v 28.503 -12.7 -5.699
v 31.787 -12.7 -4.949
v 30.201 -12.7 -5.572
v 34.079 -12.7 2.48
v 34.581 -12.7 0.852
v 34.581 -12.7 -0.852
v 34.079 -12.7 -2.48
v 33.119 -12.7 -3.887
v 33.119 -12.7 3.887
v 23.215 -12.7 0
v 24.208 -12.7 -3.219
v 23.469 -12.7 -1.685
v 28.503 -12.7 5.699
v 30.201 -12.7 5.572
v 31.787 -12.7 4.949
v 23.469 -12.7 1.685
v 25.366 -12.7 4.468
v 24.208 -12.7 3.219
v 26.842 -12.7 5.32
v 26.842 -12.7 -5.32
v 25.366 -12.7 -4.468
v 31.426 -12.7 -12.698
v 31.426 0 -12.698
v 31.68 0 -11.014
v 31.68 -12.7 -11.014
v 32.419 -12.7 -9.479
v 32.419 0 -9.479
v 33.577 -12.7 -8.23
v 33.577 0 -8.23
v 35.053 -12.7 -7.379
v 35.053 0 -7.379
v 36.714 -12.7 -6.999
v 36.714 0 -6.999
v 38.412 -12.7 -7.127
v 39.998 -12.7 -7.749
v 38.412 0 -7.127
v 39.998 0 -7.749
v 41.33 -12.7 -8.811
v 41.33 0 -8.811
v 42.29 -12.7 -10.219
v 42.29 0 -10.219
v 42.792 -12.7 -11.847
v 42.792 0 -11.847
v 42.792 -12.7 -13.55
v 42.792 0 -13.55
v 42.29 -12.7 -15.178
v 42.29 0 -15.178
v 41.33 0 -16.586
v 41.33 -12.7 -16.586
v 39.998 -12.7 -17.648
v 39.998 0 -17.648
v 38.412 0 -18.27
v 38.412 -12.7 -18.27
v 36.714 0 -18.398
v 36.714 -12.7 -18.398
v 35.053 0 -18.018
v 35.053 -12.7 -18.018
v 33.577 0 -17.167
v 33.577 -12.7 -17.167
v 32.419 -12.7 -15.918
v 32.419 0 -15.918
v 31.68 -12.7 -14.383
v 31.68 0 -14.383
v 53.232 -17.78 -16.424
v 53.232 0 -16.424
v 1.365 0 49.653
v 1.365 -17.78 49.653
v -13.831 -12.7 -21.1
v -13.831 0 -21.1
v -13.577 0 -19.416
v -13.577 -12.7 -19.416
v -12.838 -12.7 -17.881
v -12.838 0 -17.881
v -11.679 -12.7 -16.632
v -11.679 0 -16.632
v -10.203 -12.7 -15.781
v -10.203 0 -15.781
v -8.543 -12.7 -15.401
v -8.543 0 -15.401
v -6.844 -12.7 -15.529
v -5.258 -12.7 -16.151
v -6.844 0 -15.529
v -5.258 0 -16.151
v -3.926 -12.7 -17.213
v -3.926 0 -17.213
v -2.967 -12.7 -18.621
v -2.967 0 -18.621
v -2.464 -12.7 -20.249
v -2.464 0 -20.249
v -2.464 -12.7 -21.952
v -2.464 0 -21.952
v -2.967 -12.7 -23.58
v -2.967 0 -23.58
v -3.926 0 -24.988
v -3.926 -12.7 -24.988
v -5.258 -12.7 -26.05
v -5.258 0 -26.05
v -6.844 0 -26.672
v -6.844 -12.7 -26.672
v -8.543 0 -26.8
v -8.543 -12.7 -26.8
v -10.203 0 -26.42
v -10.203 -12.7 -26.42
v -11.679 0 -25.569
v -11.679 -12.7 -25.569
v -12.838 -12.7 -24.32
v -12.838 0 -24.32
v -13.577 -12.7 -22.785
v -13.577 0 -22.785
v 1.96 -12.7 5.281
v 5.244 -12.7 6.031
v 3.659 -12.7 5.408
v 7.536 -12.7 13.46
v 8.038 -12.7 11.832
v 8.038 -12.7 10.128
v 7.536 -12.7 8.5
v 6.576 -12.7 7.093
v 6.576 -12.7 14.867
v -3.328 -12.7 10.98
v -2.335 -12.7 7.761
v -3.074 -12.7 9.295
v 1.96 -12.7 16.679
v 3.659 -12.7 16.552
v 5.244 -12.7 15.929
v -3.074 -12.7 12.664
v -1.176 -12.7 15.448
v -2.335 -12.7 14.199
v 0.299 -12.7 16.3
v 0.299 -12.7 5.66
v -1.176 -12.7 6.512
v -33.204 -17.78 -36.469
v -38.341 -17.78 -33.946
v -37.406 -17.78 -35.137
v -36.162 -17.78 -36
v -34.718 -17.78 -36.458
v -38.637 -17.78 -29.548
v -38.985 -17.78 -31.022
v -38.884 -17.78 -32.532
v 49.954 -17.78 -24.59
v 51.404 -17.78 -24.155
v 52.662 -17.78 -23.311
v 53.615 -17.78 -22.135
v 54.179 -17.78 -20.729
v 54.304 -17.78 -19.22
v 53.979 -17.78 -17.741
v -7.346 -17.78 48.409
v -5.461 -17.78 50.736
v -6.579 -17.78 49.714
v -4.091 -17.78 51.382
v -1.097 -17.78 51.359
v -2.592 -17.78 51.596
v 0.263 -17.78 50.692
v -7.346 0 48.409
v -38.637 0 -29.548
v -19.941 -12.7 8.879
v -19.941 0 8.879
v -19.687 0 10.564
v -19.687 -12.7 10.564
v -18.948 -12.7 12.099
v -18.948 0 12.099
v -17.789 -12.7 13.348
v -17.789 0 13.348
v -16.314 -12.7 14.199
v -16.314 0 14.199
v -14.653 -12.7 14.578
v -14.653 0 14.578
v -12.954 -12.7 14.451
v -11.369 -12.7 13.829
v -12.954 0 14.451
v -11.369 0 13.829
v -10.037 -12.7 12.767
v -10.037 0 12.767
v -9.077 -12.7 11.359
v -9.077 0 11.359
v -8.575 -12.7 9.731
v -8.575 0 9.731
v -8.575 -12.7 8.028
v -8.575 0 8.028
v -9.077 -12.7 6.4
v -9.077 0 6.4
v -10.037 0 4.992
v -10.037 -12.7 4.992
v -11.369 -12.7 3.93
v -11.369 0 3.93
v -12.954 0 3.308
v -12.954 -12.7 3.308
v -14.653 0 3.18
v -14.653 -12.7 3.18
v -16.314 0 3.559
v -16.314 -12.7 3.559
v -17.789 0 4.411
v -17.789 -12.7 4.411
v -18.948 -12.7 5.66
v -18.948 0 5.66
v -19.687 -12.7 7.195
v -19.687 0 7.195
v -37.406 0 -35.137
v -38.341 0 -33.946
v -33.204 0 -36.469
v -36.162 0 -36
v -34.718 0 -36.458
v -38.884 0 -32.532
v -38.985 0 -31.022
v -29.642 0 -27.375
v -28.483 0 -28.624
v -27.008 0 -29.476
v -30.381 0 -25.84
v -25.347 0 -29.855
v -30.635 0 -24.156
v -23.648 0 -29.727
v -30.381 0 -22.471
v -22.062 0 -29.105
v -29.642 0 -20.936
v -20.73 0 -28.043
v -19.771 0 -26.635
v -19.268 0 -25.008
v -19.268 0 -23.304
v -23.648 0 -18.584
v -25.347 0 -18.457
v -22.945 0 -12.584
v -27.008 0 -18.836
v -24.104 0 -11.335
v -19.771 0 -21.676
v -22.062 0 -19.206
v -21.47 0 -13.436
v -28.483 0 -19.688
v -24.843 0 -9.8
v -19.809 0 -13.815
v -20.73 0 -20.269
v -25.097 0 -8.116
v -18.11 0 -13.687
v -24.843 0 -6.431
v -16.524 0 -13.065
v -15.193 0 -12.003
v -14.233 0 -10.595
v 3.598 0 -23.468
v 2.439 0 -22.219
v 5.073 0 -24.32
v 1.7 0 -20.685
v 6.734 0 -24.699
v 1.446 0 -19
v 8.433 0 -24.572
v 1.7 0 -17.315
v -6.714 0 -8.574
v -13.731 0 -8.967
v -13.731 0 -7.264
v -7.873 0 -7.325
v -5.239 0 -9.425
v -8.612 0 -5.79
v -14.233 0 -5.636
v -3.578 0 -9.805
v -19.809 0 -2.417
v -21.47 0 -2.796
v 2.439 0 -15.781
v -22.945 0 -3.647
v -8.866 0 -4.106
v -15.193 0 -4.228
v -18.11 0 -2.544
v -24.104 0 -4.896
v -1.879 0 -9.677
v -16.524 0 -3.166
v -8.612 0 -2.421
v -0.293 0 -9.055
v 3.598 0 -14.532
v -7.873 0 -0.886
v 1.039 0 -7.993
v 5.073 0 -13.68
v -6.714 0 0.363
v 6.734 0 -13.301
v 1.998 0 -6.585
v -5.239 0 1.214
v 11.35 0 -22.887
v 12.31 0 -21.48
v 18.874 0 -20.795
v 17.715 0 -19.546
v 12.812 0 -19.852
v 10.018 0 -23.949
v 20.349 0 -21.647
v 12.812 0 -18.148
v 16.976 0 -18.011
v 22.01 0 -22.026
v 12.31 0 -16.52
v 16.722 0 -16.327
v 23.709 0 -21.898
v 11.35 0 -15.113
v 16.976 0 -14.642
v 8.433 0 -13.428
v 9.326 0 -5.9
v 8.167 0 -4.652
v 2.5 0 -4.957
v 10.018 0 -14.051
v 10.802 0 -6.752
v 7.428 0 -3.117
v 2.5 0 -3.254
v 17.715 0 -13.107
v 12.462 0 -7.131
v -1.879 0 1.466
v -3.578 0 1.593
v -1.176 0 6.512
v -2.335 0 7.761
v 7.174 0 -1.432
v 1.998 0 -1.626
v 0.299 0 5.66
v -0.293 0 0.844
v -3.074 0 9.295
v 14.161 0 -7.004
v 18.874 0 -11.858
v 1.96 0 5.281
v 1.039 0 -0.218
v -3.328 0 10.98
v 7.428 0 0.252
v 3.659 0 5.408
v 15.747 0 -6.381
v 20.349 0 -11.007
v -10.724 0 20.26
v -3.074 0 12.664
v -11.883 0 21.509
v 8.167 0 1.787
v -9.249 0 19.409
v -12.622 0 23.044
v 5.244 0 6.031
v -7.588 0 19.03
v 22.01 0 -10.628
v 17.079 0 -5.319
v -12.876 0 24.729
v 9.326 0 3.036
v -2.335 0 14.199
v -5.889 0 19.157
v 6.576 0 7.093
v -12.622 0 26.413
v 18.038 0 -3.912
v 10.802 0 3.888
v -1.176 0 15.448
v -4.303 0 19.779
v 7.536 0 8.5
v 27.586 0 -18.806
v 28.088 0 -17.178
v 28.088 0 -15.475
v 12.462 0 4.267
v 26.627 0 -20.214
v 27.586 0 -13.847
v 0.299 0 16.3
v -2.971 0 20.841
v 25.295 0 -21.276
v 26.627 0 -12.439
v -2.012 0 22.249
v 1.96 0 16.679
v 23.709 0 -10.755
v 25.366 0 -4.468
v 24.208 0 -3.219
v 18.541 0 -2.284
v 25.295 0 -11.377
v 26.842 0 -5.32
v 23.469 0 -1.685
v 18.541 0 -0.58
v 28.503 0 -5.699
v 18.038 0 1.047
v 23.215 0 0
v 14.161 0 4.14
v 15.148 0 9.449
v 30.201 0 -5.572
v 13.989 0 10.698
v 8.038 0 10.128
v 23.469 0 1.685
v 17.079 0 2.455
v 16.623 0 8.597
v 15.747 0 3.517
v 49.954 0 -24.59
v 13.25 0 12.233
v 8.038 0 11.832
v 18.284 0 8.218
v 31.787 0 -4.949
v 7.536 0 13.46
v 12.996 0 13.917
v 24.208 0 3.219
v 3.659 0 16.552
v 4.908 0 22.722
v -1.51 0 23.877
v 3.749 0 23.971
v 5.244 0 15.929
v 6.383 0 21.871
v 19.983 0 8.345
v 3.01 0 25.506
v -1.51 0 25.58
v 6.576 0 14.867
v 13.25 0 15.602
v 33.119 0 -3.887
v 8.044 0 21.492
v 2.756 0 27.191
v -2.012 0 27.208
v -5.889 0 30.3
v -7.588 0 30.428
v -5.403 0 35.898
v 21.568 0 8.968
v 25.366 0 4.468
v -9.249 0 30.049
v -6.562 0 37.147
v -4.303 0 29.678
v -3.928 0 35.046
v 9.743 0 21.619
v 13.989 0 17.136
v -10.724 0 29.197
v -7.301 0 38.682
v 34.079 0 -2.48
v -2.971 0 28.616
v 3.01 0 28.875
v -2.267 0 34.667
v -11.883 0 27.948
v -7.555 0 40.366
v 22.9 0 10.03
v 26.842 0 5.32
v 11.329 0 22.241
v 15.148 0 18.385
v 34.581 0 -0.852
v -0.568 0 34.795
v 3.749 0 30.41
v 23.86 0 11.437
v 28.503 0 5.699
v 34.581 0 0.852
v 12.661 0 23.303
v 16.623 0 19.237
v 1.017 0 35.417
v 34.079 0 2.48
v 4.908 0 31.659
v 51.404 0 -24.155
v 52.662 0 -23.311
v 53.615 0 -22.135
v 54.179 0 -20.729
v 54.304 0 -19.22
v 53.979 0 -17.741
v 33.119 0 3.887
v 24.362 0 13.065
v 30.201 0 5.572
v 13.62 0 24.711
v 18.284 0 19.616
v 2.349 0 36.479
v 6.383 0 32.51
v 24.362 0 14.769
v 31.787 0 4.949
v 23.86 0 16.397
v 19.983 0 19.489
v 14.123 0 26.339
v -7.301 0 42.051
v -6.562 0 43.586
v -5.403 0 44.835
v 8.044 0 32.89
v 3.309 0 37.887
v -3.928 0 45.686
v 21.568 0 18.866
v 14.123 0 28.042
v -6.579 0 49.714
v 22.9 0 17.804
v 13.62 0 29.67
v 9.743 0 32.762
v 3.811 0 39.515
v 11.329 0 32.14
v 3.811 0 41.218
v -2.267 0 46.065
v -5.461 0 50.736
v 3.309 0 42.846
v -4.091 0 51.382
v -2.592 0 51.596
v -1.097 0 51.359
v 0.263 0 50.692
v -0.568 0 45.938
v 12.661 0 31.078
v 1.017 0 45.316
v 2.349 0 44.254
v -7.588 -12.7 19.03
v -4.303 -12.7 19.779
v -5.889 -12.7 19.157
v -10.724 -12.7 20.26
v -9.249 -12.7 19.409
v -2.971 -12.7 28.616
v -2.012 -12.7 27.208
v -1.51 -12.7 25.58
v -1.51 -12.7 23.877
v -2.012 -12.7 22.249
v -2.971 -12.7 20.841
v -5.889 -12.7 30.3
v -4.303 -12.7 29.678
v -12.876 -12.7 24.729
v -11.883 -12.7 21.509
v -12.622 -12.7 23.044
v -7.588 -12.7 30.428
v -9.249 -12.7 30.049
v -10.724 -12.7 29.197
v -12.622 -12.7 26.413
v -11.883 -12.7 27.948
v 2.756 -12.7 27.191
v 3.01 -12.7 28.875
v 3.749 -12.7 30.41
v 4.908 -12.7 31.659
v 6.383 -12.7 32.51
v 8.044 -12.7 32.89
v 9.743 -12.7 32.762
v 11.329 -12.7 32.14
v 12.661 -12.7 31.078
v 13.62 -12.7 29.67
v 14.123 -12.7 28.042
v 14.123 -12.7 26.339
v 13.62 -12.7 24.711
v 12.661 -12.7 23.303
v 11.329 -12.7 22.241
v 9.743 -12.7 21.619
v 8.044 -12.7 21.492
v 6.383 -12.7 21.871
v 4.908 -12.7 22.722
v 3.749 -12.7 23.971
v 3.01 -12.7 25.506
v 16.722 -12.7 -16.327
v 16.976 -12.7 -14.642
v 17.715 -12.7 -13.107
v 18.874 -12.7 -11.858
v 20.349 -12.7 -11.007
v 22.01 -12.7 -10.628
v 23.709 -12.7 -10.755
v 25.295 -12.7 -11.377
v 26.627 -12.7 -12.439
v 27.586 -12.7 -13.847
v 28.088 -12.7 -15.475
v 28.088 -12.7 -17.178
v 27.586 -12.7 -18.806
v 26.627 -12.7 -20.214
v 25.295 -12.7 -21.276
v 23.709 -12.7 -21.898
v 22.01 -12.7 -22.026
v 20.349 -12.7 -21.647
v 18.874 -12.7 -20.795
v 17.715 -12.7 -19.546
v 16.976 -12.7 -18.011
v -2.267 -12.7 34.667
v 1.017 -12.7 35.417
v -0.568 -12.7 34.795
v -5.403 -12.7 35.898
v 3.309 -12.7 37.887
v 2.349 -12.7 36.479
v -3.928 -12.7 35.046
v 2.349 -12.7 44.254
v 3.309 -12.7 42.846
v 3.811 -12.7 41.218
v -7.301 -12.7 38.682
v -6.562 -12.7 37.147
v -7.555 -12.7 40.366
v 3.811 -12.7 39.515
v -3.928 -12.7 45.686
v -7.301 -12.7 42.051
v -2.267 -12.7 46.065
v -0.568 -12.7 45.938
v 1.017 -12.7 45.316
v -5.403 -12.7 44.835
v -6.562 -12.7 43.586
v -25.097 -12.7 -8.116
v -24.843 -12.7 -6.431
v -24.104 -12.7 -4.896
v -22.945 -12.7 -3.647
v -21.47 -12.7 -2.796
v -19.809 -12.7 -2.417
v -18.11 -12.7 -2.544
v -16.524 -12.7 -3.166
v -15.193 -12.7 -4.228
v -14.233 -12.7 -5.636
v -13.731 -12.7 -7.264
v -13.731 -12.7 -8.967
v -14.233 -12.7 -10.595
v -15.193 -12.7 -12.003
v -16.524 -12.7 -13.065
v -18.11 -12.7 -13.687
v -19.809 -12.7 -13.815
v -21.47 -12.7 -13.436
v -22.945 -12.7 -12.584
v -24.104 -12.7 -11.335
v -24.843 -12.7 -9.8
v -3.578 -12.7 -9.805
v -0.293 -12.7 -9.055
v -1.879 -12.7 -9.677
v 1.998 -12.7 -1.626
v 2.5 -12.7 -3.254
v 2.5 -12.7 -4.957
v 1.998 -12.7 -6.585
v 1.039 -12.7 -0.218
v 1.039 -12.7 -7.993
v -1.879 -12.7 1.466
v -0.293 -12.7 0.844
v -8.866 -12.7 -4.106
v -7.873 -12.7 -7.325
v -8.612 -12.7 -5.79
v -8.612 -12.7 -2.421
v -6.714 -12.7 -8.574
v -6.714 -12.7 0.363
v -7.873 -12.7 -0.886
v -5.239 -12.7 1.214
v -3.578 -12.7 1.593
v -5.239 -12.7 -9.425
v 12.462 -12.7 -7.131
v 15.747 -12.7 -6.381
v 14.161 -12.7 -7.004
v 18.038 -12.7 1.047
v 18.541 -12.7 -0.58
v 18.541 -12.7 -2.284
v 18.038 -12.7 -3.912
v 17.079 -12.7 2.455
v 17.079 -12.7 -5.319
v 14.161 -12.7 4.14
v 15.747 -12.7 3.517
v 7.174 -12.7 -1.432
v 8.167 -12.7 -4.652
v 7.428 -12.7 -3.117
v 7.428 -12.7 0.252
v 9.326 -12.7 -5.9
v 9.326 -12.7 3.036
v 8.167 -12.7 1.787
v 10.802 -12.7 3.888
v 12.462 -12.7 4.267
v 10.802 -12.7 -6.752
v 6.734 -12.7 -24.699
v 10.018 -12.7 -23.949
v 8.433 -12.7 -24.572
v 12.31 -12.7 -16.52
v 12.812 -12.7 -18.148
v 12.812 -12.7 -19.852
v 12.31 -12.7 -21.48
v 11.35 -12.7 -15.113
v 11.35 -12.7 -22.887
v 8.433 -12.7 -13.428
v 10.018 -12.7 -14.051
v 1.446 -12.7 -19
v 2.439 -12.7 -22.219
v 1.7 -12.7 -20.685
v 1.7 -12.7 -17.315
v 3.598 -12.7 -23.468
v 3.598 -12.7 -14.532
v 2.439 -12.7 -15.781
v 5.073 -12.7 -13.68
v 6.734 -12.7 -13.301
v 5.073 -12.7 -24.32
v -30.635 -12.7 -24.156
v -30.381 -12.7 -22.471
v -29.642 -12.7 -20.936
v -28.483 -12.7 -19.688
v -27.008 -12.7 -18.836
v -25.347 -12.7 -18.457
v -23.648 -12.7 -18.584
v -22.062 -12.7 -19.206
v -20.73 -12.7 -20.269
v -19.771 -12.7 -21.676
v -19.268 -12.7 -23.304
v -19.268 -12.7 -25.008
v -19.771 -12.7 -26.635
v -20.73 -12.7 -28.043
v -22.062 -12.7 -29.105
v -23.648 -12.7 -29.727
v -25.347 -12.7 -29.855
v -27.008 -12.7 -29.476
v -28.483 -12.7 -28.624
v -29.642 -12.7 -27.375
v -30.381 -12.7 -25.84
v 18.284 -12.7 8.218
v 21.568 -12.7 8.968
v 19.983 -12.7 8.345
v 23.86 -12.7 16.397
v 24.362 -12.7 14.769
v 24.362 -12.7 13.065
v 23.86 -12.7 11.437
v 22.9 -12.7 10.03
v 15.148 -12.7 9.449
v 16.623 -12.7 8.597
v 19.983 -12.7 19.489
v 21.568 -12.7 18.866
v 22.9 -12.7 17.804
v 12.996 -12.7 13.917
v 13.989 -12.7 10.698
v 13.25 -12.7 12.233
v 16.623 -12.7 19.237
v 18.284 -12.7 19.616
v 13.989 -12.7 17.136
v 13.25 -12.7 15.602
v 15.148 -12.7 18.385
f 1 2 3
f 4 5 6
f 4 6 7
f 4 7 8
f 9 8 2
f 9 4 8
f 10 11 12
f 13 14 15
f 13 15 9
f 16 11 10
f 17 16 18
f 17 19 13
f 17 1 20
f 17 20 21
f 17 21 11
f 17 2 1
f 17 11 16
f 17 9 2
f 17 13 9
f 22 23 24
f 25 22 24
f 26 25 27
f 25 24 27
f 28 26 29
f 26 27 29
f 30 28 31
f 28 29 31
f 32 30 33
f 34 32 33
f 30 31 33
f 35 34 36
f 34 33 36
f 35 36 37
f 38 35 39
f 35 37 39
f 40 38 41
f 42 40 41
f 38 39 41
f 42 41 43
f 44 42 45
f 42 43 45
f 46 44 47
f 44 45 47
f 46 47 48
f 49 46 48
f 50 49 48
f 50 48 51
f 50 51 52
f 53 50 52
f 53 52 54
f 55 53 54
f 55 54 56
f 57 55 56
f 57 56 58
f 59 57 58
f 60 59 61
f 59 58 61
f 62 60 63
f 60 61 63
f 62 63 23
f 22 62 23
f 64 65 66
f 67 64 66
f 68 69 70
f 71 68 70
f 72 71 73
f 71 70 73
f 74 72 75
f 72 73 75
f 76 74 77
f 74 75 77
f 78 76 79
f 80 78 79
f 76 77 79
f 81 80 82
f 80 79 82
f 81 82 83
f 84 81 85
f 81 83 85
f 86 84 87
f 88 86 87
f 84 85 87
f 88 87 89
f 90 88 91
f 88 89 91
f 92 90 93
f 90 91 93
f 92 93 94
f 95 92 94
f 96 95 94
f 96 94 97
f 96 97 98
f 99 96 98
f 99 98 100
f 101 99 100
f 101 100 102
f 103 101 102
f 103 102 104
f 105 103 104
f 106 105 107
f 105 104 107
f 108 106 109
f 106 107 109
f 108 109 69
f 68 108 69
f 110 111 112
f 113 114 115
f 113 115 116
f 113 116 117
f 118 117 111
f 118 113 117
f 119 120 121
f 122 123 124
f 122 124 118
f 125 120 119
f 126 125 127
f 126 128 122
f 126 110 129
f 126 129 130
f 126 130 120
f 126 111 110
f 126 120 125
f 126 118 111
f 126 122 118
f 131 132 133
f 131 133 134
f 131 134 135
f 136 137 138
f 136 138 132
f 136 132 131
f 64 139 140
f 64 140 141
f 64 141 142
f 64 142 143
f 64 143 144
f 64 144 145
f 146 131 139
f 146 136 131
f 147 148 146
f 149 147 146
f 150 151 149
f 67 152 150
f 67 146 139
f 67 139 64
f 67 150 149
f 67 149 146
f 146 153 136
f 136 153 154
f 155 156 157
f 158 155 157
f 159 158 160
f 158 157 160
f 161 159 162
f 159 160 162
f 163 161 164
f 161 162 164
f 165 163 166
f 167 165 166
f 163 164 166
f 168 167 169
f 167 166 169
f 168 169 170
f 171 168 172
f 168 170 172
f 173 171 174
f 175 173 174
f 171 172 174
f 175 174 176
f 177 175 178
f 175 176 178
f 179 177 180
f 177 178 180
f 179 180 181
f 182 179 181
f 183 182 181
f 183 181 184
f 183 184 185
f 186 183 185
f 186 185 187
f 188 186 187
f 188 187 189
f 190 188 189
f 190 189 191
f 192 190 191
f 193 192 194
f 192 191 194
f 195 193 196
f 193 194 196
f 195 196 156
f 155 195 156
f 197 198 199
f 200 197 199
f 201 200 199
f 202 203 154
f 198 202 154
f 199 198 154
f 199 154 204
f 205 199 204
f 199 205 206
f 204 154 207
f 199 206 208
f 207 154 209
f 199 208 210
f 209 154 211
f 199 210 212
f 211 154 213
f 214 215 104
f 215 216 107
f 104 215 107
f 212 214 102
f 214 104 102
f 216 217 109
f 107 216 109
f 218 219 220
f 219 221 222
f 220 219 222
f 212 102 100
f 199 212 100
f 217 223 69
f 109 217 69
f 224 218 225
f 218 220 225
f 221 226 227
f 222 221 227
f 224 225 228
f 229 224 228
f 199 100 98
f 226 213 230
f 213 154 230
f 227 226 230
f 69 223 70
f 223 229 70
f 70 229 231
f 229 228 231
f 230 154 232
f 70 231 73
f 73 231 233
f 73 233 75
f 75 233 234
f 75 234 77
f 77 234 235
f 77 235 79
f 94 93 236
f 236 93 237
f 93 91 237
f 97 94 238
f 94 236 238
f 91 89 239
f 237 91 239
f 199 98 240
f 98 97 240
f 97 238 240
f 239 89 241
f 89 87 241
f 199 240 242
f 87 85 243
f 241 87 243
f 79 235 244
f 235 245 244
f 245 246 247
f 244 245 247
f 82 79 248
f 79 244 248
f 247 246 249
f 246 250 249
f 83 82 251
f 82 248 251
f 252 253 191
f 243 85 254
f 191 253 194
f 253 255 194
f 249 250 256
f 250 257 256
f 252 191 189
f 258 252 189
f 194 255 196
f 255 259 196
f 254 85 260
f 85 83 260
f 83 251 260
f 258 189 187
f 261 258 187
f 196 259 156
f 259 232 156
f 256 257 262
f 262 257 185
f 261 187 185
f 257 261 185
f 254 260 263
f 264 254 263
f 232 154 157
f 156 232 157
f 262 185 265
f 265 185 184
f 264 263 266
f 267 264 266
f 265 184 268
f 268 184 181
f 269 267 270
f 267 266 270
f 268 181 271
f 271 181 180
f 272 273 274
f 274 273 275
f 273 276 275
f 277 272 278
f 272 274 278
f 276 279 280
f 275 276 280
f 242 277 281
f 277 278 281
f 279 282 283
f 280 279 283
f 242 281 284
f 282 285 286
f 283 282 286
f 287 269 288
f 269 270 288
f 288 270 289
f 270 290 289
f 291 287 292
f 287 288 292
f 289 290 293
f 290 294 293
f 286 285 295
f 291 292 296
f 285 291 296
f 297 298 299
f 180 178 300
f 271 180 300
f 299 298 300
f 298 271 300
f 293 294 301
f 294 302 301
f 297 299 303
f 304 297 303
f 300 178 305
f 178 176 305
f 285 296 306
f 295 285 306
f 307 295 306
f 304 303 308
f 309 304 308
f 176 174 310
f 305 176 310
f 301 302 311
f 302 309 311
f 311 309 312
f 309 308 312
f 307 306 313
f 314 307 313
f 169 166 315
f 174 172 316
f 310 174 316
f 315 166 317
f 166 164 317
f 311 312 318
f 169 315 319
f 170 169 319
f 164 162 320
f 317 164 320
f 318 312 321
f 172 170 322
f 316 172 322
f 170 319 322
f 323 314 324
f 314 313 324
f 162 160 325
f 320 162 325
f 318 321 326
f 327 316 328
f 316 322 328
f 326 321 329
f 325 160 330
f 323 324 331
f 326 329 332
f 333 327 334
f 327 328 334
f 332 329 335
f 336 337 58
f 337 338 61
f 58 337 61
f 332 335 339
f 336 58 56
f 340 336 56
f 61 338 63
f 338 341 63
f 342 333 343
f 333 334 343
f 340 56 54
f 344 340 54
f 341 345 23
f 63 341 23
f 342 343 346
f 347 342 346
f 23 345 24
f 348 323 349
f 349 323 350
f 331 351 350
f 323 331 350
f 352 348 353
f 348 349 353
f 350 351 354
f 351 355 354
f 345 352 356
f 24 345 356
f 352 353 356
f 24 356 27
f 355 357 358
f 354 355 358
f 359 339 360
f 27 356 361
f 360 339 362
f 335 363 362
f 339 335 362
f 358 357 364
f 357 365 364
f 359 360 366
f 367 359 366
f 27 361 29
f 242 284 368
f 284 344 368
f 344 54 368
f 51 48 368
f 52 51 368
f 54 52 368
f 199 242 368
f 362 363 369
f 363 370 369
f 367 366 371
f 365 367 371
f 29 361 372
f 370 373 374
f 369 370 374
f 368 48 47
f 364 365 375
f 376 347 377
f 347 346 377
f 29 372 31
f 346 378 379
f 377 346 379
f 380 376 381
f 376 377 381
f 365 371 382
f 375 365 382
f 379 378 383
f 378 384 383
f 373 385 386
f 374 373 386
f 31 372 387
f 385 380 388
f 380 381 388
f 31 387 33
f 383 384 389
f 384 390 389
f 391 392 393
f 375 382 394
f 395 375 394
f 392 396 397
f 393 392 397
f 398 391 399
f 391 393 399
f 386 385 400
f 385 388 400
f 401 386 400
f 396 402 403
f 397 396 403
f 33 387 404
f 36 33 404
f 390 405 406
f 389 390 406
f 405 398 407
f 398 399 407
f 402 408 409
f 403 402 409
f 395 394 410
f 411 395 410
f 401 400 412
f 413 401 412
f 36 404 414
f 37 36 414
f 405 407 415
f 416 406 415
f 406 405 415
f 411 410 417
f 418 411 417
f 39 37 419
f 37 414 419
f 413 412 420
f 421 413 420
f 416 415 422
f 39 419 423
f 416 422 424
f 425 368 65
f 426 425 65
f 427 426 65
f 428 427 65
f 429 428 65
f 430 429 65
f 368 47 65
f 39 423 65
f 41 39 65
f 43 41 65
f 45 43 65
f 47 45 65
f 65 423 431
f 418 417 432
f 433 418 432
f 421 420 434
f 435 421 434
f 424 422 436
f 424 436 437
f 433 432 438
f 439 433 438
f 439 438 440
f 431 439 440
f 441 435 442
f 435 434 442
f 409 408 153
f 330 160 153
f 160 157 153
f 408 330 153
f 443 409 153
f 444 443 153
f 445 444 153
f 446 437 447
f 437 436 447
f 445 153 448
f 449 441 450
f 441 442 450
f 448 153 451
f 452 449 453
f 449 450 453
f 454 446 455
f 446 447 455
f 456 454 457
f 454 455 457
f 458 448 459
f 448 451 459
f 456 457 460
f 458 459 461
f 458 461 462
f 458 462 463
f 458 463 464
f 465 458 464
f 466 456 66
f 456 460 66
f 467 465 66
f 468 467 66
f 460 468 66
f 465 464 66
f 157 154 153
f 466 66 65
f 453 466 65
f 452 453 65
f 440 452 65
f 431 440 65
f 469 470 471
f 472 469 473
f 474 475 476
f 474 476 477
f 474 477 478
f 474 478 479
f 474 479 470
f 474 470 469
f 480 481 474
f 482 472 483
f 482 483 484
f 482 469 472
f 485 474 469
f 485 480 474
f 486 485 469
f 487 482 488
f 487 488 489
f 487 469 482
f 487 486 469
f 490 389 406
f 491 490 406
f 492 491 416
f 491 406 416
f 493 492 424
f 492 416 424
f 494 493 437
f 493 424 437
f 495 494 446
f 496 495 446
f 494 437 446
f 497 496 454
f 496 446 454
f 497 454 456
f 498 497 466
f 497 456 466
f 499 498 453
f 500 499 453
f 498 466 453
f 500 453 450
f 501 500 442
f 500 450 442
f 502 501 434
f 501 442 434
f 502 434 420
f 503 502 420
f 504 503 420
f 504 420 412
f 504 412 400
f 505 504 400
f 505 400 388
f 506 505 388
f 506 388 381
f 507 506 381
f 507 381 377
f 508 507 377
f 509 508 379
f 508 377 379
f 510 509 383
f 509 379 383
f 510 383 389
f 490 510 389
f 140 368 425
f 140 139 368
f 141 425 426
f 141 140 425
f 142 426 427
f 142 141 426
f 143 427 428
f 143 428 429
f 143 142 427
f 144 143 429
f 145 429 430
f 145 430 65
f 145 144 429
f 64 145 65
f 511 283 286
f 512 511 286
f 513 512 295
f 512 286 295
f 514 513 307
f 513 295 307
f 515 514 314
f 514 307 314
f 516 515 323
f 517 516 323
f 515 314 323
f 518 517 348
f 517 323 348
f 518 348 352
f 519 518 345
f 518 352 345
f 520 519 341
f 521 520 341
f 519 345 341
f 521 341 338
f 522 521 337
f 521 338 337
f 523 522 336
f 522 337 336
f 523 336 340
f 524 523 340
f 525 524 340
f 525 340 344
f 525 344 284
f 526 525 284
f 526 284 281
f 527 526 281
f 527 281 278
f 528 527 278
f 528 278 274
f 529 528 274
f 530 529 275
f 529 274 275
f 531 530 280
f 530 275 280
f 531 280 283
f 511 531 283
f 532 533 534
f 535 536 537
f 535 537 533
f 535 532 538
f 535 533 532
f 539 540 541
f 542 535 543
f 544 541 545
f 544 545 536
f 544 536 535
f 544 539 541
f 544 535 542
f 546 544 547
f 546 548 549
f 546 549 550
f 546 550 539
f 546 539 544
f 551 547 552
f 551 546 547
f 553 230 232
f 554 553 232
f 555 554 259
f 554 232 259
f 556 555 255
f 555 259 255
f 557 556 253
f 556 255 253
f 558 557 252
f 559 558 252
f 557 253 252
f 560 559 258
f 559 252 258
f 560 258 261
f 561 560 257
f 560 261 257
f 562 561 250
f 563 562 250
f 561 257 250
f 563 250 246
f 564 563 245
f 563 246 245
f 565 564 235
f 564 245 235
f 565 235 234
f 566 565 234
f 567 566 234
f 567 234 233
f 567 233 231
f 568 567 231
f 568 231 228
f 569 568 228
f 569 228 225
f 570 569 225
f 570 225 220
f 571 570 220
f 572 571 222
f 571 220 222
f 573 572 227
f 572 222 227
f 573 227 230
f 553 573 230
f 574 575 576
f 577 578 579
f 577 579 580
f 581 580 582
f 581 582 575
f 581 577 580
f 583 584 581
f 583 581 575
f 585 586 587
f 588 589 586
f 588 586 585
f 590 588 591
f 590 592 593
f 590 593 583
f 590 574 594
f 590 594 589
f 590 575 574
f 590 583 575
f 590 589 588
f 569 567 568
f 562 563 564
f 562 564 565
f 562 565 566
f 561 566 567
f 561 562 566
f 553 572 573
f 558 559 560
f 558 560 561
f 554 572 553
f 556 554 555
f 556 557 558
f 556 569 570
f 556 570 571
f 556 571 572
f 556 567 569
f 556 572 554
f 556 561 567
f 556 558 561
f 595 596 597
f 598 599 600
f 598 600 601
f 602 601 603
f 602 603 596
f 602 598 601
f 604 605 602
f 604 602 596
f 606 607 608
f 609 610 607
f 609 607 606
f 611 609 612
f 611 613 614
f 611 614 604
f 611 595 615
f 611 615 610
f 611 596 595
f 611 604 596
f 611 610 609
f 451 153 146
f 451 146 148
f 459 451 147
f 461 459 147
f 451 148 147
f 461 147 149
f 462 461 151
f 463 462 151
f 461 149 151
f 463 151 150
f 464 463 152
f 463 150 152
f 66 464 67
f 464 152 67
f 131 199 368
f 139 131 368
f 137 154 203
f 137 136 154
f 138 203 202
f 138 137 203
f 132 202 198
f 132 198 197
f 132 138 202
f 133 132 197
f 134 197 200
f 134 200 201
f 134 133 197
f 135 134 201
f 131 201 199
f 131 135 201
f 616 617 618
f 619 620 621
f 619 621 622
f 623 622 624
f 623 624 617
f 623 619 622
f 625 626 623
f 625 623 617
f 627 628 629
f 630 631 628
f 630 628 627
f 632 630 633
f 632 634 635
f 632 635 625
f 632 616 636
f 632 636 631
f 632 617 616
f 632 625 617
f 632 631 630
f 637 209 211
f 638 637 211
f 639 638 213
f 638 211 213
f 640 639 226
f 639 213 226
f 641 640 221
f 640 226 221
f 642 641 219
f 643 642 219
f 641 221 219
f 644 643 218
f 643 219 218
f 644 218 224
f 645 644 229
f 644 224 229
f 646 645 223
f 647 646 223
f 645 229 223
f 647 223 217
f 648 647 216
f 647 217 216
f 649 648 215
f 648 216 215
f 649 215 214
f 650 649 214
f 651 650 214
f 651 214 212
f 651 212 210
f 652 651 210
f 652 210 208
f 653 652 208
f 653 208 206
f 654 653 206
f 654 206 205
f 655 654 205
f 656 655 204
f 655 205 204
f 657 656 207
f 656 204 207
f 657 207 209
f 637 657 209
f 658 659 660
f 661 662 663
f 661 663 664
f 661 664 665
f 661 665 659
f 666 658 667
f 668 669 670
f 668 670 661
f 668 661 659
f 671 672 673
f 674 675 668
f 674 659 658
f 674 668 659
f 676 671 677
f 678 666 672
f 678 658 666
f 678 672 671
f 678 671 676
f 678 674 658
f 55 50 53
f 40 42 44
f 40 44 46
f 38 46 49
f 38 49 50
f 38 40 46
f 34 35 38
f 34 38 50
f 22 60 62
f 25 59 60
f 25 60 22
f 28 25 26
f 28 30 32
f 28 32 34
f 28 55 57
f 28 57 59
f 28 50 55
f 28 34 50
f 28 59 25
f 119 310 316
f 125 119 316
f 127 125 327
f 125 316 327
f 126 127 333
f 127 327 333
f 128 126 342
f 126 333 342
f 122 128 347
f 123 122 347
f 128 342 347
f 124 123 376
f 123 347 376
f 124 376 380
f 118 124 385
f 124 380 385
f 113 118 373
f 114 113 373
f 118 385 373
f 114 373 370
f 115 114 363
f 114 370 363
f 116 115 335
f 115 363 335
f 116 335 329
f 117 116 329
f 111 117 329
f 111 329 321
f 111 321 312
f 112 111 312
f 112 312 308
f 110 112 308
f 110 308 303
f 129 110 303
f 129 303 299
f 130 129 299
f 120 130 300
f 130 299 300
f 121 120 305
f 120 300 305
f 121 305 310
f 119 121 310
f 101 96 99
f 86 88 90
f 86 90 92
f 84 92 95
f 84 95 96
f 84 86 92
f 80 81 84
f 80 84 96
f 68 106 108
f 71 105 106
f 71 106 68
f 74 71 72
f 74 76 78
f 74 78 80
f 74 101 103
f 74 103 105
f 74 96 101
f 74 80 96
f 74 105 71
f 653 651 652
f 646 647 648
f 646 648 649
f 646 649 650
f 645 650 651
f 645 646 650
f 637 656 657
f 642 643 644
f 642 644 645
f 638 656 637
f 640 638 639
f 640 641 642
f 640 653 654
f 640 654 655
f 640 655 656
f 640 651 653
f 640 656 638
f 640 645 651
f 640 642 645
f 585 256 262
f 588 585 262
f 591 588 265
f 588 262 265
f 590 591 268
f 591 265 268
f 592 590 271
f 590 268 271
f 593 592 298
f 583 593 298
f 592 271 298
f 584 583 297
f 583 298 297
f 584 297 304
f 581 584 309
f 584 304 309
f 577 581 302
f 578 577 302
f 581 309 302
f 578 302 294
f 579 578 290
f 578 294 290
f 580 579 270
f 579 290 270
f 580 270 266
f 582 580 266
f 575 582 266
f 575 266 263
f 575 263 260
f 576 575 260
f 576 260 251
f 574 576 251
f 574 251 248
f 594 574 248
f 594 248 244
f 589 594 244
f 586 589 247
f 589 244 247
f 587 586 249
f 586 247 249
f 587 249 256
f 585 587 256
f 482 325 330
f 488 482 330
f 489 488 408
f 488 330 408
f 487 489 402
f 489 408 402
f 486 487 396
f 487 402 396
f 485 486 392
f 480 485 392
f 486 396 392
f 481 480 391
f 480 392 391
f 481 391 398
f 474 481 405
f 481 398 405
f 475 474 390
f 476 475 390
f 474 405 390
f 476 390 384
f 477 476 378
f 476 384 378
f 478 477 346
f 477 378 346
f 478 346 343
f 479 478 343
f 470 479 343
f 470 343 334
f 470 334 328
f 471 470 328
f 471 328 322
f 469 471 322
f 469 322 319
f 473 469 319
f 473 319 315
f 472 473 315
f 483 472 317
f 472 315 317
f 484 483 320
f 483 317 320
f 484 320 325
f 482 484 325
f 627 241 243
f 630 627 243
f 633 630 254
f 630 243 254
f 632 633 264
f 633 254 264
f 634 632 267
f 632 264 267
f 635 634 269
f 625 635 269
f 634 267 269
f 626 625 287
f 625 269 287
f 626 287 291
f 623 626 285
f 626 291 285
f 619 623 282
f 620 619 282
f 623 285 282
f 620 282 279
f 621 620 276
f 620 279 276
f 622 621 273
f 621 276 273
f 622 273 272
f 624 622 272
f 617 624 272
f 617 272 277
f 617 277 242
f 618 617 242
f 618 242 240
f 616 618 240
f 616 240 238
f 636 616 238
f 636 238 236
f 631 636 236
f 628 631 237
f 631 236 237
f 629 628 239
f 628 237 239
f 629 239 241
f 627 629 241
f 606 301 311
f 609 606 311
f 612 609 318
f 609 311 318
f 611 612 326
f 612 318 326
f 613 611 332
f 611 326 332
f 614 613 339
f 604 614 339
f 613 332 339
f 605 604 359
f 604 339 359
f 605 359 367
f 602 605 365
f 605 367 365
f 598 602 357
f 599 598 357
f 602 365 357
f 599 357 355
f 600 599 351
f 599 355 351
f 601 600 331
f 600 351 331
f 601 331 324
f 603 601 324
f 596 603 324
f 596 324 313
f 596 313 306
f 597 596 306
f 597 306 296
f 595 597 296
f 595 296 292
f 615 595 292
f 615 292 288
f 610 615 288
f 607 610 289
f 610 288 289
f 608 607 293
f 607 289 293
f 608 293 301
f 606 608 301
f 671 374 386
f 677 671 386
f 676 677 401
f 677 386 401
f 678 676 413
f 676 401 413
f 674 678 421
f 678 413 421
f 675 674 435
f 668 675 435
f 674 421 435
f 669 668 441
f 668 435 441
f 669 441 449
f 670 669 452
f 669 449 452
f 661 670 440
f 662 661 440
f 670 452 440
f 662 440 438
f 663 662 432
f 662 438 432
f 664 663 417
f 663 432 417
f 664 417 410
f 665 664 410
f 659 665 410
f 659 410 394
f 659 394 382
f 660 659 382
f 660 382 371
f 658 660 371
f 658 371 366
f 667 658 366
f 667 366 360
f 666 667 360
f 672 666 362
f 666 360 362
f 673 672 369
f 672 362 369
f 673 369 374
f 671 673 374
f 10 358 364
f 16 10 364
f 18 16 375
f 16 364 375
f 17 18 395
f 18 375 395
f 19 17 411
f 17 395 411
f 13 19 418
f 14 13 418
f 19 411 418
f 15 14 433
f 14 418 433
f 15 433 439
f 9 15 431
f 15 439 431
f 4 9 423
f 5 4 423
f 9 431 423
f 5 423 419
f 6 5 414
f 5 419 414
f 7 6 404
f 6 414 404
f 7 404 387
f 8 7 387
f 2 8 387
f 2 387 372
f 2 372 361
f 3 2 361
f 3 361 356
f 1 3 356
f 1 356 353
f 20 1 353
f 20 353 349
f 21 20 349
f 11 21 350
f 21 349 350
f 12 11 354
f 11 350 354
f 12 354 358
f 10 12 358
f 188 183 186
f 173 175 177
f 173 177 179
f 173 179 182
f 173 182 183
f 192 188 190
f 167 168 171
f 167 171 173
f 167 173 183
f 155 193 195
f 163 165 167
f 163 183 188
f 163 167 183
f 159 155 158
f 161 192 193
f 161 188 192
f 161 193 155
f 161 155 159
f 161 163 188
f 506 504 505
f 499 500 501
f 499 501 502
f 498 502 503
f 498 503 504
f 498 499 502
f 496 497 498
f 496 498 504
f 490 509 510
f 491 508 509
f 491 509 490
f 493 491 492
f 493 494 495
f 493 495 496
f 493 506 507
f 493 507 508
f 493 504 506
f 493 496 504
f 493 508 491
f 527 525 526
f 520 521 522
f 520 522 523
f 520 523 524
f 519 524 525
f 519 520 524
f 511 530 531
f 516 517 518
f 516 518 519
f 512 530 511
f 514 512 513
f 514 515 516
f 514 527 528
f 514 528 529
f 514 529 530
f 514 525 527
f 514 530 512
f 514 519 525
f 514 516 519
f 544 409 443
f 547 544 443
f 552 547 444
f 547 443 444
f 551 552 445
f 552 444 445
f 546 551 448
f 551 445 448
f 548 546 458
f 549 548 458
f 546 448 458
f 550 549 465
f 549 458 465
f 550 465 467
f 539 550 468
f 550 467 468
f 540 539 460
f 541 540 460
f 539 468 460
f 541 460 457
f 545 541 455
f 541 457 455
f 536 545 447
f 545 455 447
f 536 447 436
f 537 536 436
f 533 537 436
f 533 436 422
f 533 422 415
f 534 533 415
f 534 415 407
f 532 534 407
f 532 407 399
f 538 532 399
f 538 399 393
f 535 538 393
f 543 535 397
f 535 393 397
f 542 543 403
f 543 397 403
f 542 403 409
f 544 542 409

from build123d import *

# Parameters (mm, degrees)
F1_DEPTH = 17.78
F2_R     = 5.08
F4_R     = 5.715
F5_DEPTH = 12.7


with BuildPart() as f1:
    # F0 (on Front) → F1 (new body)
    with BuildSketch(Plane.XZ):
        Polygon((-4.068127, 56.574355), (-41.914549, -37.713546), (58.66438, -23.345558), align=None)
    extrude(amount=F1_DEPTH)

    # F2
    f2_edges = [f1.edges().sort_by_distance(p)[0] for p in [
        (-4.068127, -8.89, 56.574355),
        (58.66438, -8.89, -23.345558),
        (-41.914549, -8.89, -37.713546),
    ]]
    fillet(f2_edges, radius=F2_R)

    # F4 (on face) → F5 (cut)
    with BuildSketch(Plane(origin=(0, 0, 0), x_dir=(-1, 0, 0), z_dir=(0, 1, 0))):
        with Locations((1.840184, 40.36641)):
            Circle(F4_R)
        with Locations((-8.471368, 27.190541)):
            Circle(F4_R)
        with Locations((7.1608, 24.728628)):
            Circle(F4_R)
        with Locations((-18.710878, 13.917103)):
            Circle(F4_R)
        with Locations((-2.386934, 10.979893)):
            Circle(F4_R)
        with Locations((14.226123, 8.879391)):
            Circle(F4_R)
        with Locations((-12.889439, -1.43216)):
            Circle(F4_R)
        with Locations((3.150751, -4.105525)):
            Circle(F4_R)
        with Locations((19.381898, -8.115573)):
            Circle(F4_R)
        with Locations((-22.437172, -16.326623)):
            Circle(F4_R)
        with Locations((-7.1608, -18.999988)):
            Circle(F4_R)
        with Locations((8.115572, -21.100491)):
            Circle(F4_R)
        with Locations((-28.92963, 0)):
            Circle(F4_R)
        with Locations((-37.140679, -12.698484)):
            Circle(F4_R)
        with Locations((24.919583, -24.155764)):
            Circle(F4_R)
    extrude(amount=-F5_DEPTH, mode=Mode.SUBTRACT)


solid = f1.part
